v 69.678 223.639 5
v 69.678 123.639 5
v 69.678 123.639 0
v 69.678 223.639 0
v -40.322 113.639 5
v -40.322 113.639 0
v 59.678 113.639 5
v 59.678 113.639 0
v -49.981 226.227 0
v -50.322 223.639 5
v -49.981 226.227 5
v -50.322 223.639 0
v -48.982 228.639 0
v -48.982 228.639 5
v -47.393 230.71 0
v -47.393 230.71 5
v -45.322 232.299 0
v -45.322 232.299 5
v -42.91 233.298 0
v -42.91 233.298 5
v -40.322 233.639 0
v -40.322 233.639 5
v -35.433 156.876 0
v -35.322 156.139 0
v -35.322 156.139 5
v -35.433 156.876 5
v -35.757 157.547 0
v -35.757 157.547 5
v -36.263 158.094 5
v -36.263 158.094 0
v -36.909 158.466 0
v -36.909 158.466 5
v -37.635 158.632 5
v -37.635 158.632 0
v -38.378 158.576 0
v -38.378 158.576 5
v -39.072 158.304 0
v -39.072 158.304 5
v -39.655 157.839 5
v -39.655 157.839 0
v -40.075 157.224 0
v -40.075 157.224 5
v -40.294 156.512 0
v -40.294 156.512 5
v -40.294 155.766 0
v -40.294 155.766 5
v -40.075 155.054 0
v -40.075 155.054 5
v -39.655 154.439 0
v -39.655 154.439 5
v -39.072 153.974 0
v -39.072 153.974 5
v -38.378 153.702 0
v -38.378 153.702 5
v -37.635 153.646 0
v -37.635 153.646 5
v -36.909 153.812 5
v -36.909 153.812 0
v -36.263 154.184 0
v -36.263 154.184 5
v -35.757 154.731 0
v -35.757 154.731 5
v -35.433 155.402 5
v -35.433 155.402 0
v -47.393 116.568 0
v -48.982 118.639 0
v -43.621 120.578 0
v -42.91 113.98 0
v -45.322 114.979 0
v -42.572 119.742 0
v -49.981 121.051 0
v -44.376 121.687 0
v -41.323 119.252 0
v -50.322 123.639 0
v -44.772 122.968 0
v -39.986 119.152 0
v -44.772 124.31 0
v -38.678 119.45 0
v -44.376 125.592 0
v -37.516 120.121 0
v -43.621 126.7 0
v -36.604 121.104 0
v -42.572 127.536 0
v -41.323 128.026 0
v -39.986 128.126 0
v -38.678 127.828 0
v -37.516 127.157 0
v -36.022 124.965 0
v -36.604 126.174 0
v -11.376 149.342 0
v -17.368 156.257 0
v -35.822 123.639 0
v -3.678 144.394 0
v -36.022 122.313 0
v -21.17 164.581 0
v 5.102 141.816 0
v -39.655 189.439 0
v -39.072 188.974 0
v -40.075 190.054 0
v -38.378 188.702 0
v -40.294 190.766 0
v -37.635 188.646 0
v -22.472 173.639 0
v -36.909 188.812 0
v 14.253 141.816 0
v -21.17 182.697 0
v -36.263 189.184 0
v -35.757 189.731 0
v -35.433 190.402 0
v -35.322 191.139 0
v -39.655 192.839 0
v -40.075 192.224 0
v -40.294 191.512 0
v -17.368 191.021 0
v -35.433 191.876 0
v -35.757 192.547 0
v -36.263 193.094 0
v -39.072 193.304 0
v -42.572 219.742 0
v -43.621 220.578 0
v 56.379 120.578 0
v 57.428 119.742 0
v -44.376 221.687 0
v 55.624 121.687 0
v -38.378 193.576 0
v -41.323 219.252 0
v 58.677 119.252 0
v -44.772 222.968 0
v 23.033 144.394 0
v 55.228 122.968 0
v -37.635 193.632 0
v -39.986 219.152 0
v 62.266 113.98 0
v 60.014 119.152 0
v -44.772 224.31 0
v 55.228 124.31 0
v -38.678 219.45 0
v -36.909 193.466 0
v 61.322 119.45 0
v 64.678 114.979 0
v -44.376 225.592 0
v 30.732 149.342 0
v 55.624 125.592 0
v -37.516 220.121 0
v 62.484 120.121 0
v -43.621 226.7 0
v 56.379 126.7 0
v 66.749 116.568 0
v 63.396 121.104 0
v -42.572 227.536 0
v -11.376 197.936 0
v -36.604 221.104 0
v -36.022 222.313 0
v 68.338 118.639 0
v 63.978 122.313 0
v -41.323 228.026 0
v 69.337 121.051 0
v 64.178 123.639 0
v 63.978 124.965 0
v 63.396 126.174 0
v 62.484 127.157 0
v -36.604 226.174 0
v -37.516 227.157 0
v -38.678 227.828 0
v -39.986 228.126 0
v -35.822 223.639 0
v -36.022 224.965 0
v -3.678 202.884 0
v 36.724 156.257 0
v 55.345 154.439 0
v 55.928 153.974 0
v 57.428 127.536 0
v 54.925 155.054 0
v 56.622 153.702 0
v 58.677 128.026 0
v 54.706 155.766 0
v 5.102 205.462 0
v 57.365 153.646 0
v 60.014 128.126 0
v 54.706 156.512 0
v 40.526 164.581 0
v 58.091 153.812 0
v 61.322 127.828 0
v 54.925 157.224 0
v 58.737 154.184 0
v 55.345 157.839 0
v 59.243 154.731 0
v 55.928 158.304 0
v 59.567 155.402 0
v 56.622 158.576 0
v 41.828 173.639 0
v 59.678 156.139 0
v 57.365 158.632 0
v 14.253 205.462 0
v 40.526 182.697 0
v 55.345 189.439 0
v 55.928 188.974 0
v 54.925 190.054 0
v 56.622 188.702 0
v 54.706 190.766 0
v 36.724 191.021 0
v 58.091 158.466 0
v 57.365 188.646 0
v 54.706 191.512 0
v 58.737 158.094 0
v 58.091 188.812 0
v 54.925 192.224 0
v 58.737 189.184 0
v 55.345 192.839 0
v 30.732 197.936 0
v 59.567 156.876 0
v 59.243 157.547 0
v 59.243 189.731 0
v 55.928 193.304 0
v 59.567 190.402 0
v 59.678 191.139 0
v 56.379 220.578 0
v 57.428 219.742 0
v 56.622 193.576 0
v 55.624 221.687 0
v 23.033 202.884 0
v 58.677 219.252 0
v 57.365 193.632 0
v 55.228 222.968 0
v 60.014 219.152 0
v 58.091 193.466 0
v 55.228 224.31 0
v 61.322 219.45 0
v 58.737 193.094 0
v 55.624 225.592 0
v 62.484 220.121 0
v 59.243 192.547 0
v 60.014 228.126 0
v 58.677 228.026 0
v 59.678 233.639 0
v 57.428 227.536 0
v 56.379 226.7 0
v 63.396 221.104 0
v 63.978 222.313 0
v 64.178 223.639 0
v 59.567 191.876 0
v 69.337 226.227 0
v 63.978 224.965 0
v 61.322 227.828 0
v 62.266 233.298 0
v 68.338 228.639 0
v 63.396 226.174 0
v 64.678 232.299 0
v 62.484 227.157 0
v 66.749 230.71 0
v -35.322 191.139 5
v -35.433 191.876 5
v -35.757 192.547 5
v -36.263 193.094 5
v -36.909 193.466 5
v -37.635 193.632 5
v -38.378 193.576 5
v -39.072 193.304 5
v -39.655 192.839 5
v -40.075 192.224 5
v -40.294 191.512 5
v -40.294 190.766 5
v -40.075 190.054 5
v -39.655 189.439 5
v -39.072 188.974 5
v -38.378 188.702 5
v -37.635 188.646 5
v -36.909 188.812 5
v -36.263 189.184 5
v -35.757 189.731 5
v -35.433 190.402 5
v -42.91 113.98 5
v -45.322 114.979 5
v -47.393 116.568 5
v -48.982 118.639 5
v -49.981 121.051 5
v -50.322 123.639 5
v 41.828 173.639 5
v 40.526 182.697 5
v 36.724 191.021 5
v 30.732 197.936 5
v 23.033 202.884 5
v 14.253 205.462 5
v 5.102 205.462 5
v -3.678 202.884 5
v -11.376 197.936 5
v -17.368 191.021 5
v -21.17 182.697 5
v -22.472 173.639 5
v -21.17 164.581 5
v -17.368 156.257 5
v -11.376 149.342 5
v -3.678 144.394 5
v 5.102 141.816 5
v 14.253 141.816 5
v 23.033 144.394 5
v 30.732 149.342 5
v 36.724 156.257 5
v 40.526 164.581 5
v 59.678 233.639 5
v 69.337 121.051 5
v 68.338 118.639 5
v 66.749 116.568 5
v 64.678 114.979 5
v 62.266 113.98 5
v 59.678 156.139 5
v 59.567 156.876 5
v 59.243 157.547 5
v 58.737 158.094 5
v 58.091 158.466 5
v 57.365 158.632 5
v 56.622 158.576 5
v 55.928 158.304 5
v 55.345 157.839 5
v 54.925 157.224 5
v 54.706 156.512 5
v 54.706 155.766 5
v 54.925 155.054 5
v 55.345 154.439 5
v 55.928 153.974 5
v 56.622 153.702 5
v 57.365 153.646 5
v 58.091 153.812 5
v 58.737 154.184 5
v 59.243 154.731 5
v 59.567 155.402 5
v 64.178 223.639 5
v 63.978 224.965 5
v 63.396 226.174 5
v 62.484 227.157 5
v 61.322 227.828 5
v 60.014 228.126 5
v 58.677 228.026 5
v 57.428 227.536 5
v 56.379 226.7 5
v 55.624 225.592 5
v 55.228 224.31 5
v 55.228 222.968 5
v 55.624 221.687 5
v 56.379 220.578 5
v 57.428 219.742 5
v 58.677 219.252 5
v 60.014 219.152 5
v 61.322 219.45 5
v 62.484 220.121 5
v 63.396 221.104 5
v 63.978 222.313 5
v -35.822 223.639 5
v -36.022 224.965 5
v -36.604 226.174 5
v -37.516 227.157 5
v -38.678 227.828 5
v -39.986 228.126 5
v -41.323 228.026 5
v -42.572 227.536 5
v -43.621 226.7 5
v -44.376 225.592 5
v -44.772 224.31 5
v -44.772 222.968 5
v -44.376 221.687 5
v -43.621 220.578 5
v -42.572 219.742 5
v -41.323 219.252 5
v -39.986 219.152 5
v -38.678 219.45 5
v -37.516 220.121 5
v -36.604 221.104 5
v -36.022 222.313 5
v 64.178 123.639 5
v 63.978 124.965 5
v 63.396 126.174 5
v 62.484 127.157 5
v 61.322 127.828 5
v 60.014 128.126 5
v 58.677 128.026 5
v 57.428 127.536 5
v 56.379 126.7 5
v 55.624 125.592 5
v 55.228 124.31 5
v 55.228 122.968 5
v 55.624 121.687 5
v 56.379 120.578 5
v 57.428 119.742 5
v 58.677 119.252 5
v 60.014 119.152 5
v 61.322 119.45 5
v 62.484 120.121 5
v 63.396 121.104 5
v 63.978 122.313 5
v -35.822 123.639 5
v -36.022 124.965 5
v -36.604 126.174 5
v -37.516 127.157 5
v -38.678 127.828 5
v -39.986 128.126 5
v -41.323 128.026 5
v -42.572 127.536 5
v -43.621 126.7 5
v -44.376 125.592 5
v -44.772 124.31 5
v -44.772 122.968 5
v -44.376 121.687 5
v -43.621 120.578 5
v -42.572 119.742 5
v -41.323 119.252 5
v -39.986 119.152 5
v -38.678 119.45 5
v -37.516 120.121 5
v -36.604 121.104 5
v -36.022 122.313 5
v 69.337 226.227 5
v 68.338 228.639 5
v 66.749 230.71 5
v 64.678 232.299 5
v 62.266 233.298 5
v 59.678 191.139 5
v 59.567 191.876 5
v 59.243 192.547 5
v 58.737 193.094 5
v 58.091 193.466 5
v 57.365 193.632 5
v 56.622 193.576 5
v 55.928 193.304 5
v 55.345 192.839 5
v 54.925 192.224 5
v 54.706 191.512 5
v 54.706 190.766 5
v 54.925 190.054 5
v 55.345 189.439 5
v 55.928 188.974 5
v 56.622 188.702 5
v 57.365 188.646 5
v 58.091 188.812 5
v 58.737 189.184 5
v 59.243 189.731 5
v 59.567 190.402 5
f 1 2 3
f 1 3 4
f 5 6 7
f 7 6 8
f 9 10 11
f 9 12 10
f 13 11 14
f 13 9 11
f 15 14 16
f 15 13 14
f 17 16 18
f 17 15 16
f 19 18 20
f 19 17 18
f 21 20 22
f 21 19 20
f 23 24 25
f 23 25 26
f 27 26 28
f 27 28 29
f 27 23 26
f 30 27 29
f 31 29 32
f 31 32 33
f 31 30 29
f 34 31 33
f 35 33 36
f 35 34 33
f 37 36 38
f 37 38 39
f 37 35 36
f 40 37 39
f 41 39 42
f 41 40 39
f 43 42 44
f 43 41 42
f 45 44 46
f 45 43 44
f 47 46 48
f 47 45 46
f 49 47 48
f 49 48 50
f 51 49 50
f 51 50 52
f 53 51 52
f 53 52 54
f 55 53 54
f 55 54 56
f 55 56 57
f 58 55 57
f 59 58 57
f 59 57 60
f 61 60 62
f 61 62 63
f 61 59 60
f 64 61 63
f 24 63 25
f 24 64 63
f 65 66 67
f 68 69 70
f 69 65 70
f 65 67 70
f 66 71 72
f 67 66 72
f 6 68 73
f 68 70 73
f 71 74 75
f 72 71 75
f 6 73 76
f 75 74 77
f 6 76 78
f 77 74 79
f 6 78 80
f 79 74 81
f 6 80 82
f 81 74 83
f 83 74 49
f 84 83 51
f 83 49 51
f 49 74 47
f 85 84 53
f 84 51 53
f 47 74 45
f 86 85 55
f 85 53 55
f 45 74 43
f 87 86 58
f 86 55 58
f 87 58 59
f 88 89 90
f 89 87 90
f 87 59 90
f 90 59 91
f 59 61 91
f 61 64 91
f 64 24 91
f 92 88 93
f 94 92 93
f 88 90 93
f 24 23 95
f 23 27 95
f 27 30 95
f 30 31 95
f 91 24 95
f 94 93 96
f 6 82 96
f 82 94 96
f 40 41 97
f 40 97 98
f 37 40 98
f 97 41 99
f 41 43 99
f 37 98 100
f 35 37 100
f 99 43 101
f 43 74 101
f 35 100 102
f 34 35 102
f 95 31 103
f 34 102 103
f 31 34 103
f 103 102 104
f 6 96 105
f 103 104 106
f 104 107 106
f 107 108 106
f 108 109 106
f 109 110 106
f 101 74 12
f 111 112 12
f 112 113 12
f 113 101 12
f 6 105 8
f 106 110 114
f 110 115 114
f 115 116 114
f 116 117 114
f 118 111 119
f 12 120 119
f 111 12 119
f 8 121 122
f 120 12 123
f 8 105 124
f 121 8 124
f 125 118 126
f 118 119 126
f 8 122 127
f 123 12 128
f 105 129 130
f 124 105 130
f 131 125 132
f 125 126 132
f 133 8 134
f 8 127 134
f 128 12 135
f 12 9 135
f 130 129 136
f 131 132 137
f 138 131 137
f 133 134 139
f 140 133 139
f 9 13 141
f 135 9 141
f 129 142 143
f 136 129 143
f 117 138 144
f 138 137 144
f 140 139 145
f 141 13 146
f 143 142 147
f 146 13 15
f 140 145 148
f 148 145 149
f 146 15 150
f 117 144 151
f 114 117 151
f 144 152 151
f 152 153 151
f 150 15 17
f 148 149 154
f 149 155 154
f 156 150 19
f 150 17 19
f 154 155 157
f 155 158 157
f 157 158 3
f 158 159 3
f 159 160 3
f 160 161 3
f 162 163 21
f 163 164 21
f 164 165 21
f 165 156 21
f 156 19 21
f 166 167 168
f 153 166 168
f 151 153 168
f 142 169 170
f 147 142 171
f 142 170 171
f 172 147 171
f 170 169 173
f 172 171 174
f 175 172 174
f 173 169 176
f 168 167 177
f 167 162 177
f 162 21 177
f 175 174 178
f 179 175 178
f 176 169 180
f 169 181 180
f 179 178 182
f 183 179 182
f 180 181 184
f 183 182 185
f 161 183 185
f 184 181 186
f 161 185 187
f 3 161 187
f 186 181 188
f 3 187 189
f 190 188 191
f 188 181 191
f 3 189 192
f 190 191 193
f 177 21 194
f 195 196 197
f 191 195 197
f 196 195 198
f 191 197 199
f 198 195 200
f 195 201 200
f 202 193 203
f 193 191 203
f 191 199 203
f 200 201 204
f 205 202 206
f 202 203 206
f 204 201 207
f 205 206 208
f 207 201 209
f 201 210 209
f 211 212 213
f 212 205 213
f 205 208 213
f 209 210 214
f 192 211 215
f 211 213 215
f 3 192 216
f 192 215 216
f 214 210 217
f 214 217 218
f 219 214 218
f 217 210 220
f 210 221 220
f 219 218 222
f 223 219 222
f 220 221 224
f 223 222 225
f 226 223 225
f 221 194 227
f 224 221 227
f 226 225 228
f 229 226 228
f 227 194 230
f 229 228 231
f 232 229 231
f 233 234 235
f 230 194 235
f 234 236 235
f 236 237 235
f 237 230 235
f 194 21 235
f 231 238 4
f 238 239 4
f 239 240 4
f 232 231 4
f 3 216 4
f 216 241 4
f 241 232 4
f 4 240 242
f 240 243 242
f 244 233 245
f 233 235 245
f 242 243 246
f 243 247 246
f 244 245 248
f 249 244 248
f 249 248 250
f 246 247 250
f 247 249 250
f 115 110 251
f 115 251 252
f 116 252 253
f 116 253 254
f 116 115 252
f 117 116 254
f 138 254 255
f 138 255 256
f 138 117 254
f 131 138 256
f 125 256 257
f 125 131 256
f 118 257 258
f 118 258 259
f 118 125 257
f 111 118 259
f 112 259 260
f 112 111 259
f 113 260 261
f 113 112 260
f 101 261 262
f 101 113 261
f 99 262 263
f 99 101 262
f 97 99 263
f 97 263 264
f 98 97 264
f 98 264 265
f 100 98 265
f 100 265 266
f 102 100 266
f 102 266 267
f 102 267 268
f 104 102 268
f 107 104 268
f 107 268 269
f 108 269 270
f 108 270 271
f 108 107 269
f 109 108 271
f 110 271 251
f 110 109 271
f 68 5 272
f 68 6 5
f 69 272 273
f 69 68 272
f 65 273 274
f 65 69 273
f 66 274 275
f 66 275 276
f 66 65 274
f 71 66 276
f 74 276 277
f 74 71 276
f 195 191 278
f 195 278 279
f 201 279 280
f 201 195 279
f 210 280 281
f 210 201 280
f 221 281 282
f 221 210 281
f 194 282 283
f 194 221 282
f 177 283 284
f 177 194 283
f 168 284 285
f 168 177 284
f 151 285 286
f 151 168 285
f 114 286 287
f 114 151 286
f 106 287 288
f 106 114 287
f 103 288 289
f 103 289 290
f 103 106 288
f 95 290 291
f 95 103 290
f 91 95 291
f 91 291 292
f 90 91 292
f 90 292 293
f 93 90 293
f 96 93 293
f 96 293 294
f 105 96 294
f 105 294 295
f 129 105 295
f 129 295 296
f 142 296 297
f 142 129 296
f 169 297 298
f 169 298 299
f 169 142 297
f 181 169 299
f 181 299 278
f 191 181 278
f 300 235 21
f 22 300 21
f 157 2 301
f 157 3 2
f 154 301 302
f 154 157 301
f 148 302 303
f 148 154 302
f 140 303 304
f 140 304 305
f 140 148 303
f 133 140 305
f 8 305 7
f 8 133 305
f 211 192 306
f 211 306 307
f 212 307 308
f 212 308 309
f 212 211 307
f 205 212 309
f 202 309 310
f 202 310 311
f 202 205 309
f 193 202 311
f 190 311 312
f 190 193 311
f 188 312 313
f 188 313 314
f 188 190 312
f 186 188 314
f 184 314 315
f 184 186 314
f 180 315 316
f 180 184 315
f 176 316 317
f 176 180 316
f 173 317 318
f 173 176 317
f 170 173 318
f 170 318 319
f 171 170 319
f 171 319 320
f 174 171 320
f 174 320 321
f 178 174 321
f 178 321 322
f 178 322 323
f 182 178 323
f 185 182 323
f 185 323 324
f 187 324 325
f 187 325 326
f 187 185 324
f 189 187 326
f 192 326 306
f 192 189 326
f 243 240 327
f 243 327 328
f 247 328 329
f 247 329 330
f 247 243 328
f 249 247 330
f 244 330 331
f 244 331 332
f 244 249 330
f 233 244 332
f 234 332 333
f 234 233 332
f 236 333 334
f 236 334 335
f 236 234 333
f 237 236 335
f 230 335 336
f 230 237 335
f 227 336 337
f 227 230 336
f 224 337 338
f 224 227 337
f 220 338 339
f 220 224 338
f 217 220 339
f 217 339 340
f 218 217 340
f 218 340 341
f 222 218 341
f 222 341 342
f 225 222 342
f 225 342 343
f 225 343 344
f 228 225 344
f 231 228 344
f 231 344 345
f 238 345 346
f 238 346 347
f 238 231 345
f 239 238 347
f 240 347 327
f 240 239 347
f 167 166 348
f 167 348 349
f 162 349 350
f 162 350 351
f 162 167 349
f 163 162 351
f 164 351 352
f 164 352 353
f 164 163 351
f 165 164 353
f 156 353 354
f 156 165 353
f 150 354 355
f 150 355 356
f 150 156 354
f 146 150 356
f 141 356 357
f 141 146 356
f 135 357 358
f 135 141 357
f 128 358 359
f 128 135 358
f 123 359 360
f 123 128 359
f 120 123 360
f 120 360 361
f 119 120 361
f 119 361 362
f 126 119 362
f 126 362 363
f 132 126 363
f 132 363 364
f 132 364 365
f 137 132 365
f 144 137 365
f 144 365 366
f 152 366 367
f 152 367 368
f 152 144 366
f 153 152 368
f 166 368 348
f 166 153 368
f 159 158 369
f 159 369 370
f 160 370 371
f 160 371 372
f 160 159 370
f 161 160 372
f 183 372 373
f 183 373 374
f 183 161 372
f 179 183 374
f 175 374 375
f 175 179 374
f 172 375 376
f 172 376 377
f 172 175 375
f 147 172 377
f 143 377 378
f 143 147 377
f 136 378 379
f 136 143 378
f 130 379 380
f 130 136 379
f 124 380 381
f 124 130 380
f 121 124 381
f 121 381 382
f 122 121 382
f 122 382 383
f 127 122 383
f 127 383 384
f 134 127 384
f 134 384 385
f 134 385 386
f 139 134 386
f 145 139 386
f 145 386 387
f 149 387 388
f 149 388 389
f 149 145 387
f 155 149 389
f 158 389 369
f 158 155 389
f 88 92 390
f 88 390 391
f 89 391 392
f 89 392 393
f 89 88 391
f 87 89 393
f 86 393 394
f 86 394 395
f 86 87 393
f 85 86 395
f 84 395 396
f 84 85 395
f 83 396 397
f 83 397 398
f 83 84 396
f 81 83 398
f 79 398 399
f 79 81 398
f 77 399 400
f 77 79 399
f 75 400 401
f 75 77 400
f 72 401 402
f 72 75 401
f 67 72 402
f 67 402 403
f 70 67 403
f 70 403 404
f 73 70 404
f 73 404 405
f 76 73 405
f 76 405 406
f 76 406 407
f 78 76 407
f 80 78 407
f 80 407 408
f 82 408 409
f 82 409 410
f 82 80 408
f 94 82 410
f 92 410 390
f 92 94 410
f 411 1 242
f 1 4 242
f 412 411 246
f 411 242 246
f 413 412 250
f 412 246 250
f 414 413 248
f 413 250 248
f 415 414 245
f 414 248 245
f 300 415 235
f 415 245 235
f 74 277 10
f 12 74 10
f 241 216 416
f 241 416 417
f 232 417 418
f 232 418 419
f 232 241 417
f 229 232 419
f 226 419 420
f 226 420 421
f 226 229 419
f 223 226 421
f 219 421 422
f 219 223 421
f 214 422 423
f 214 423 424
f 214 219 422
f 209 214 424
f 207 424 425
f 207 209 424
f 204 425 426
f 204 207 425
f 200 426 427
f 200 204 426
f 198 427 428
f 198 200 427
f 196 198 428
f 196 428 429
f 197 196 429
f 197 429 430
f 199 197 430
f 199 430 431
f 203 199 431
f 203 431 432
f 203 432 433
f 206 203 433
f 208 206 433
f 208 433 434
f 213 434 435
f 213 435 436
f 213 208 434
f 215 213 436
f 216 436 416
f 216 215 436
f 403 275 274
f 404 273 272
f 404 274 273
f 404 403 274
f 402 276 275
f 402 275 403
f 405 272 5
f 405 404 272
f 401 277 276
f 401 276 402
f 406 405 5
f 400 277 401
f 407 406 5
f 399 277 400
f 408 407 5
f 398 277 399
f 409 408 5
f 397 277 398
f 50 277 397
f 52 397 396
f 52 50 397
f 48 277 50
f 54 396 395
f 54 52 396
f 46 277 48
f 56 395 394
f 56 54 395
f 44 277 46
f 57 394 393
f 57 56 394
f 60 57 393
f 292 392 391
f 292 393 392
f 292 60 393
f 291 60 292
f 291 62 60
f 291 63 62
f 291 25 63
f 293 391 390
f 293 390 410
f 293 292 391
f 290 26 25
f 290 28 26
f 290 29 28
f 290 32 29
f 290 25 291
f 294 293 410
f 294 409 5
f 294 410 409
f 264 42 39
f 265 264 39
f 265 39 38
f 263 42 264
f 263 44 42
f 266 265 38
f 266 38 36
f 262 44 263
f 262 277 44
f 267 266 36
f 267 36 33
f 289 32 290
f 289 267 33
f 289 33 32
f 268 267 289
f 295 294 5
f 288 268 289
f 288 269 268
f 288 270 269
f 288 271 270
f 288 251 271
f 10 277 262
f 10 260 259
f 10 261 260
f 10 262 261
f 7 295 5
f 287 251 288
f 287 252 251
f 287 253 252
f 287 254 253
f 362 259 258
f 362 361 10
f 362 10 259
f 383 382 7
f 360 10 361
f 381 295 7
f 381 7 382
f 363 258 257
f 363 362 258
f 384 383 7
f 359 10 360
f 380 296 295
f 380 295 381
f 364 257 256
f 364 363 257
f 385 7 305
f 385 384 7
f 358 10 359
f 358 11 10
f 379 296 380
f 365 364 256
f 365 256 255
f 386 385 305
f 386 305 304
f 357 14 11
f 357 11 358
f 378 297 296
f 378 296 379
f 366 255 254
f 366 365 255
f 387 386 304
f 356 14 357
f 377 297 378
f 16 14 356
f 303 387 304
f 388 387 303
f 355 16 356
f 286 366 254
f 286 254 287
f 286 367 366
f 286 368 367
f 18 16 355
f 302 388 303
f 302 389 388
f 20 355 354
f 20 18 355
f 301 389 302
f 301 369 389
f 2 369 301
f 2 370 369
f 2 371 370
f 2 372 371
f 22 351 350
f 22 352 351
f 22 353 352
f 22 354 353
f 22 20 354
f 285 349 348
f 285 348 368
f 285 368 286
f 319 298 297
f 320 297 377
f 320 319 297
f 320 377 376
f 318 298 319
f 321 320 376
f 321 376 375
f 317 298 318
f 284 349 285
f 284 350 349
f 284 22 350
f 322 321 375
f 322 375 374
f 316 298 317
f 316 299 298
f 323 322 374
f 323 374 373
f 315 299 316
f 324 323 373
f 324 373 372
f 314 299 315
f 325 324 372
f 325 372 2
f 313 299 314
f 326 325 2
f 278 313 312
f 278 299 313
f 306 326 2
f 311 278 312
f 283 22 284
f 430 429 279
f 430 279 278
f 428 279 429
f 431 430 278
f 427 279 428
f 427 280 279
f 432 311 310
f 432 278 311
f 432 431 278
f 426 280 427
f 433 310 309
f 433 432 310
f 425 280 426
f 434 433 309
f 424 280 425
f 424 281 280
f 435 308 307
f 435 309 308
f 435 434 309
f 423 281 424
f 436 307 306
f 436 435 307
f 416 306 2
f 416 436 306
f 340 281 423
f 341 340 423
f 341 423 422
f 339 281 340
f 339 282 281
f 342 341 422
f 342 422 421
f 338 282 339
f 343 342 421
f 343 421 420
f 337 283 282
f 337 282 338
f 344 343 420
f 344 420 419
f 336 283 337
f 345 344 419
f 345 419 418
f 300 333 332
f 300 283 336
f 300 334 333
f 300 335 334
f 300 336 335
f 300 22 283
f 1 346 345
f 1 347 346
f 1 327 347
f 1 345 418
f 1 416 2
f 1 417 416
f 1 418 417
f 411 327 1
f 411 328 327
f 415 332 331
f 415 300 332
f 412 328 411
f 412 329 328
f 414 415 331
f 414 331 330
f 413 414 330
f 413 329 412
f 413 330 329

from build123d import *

# Parameters (mm, degrees)
SKETCH2_R           = 4.5
SKETCH2_R_2         = 2.5
SKETCH2_R_3         = 39
BOSS_EXTRUDE1_DEPTH = 5
BOSS_EXTRUDE2_START = -5
SKETCH3_R           = 39
SKETCH3_R_2         = 32.15
BOSS_EXTRUDE2_DEPTH = 5
SKETCH4_W           = 10
SKETCH4_H           = 120
CUT_EXTRUDE1_DEPTH  = 247.902363645
FILLET1_R           = 10


with BuildPart() as part:
    # Sketch2 → Boss-Extrude1 (new body)
    with BuildSketch(Plane.XY):
        Polygon((79.677872198, 233.639067486), (-60.322127802, 233.639067486), (-60.322127802, 223.639067486), (-60.322127802, 113.639067486), (79.677872198, 113.639067486), align=None)
        with Locations((-40.322127802, 123.639067486)):
            Circle(SKETCH2_R, mode=Mode.SUBTRACT)
        with Locations((-37.822127802, 156.139067486)):
            Circle(SKETCH2_R_2, mode=Mode.SUBTRACT)
        with Locations((59.677872198, 123.639067486)):
            Circle(SKETCH2_R, mode=Mode.SUBTRACT)
        with Locations((57.177872198, 156.139067486)):
            Circle(SKETCH2_R_2, mode=Mode.SUBTRACT)
        with Locations((-37.822127802, 191.139067486)):
            Circle(SKETCH2_R_2, mode=Mode.SUBTRACT)
        with Locations((9.677872198, 173.639067486)):
            Circle(SKETCH2_R_3, mode=Mode.SUBTRACT)
        with Locations((-40.322127802, 223.639067486)):
            Circle(SKETCH2_R, mode=Mode.SUBTRACT)
        with Locations((57.177872198, 191.139067486)):
            Circle(SKETCH2_R_2, mode=Mode.SUBTRACT)
        with Locations((59.677872198, 223.639067486)):
            Circle(SKETCH2_R, mode=Mode.SUBTRACT)
    extrude(amount=BOSS_EXTRUDE1_DEPTH)

    # Sketch3 → Boss-Extrude2 (add)
    with BuildSketch(Plane.XY.offset(5).offset(BOSS_EXTRUDE2_START)):
        with Locations((9.677872198, 173.639067486)):
            Circle(SKETCH3_R)
        with Locations((9.677872198, 173.639067486)):
            Circle(SKETCH3_R_2, mode=Mode.SUBTRACT)
    extrude(amount=BOSS_EXTRUDE2_DEPTH)

    # Sketch4 → Cut-Extrude1 (cut, through all)
    with BuildSketch(Plane.XY.offset(5)):
        with Locations((74.677872198, 173.639067486)):
            Rectangle(SKETCH4_W, SKETCH4_H)
        with Locations((-55.322127802, 173.639067486)):
            Rectangle(SKETCH4_W, SKETCH4_H)
    extrude(amount=-CUT_EXTRUDE1_DEPTH, mode=Mode.SUBTRACT)

    # Fillet1
    fillet1_edges = [part.edges().sort_by_distance(p)[0] for p in [
        (-50.322127802, 233.639067486, 2.5),
        (-50.322127802, 113.639067486, 2.5),
        (69.677872198, 113.639067486, 2.5),
        (69.677872198, 233.639067486, 2.5),
    ]]
    fillet(fillet1_edges, radius=FILLET1_R)


solid = part.part
